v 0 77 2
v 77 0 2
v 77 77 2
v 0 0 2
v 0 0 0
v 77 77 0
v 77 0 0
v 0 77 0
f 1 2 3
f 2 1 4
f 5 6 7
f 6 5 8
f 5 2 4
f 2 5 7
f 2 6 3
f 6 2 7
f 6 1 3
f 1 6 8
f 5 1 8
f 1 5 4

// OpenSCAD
// All values in mm unless a quanity or states otherwise

/* [Render Parameters] */
Item = "ToDoTemplate"; // ["Holder", "ToDoTemplate"]
$fs = 0.2;
$fa = 0.1;

/* [Fitment] */
Global_Clearance = 0.2;

/* [Post-It] */
PostIt_Length = 77;
PostIt_Width = 77;
PostIt_Height = 15.0;

/* [Holder] */
Base_Thickness = 1.0;
Base_Padding = 2.5;
Wall_Thickness = 1.0;
Finger_Hole_Ratio = 0.5;
Finger_Hole_Radius = 5.0;

/* [Templates] */
Number_Of_Holders = 3;
Holder_thickness = 2.0;

Total_Perimeter = Base_Padding + Wall_Thickness + Global_Clearance;
Holder_Length = Number_Of_Holders > 0 ? Number_Of_Holders * (Wall_Thickness + Holder_thickness + (2 * Global_Clearance)) : 0; 
Total_Width = ((Total_Perimeter) * 2) + PostIt_Width;
Total_Length = ((Total_Perimeter) * 2) + PostIt_Length + Holder_Length;


// Model
if (Item == "Holder")
{
    render()
    {
        // Need to render to stop z fightingimport("/Users/Kuno/Documents/GitHub/3D models/Home/Post-it Template/holder_test.stl");

        PostITHolder();
    }
}
else
{
    Template(Item);
}


module Template(Item)
{
     difference()
    {
        TemplateBase();
    }
}

module TemplateBase()
{
    cube([PostIt_Width, PostIt_Length, Holder_thickness]);
}

module PostITHolder()
{
    Base();
    PostItHolder();
    if (Number_Of_Holders > 0)
    {
        TemplateHolders();
    }
}

// Design Modules
module Base()
{
    cube([Total_Width, Total_Length, Base_Thickness]);
}

module PostItHolder()
{
    noteOffset = Wall_Thickness + Global_Clearance;
    
    translate([Base_Padding, Base_Padding, Base_Thickness])
    {
        difference()
        {
            color("red")
            cube([(noteOffset * 2) + PostIt_Width, (noteOffset * 2) + PostIt_Length, PostIt_Height]);
            
            translate([Wall_Thickness, Wall_Thickness, 0])
            cube([PostIt_Width + (2 * Global_Clearance), PostIt_Length + (2 * Global_Clearance), PostIt_Height + 1]);
            
            FingerHole();
        }
    }
}

module FingerHole()
{
    holeWidth = PostIt_Width * Finger_Hole_Ratio;
    
    translate([(PostIt_Width / 2) - (holeWidth / 2),Wall_Thickness,0])
    rotate([90,0,0])
    linear_extrude(Wall_Thickness)
    {
        union()
        {
            //top rectangle
            translate([0,Finger_Hole_Radius])
            square([holeWidth, PostIt_Height - Finger_Hole_Radius]);
            
            translate([Finger_Hole_Radius,0])
            square([holeWidth - (2 * Finger_Hole_Radius), Finger_Hole_Radius]);
            
            //bottom rectangle with radius
            intersection()
            {
                square([holeWidth, Finger_Hole_Radius]);
                translate([Finger_Hole_Radius,Finger_Hole_Radius])
                circle(r = Finger_Hole_Radius);
            }
            
            intersection()
            {
                square([holeWidth, Finger_Hole_Radius]);
                translate([holeWidth - Finger_Hole_Radius,Finger_Hole_Radius])
                circle(r = Finger_Hole_Radius);    
            }
        }
    }
}

module TemplateHolders()
{
   holderYDistance = Wall_Thickness + (2 * Global_Clearance) + Holder_thickness;   
   translate([Base_Padding, Base_Padding + PostIt_Length + (2 * (Wall_Thickness + Global_Clearance)), Base_Thickness])
    {
        difference()
        {
            color("blue")
            cube([((Wall_Thickness + Global_Clearance) * 2) + PostIt_Width, Holder_Length, PostIt_Height]);
            
            for (i = [0:Number_Of_Holders - 1]) 
            {
                translate([Wall_Thickness, i * holderYDistance, 0])
                cube([PostIt_Width + (2 * Global_Clearance), Holder_thickness + (2 * Global_Clearance), PostIt_Height + 1]);
            }
        }
    }
}
